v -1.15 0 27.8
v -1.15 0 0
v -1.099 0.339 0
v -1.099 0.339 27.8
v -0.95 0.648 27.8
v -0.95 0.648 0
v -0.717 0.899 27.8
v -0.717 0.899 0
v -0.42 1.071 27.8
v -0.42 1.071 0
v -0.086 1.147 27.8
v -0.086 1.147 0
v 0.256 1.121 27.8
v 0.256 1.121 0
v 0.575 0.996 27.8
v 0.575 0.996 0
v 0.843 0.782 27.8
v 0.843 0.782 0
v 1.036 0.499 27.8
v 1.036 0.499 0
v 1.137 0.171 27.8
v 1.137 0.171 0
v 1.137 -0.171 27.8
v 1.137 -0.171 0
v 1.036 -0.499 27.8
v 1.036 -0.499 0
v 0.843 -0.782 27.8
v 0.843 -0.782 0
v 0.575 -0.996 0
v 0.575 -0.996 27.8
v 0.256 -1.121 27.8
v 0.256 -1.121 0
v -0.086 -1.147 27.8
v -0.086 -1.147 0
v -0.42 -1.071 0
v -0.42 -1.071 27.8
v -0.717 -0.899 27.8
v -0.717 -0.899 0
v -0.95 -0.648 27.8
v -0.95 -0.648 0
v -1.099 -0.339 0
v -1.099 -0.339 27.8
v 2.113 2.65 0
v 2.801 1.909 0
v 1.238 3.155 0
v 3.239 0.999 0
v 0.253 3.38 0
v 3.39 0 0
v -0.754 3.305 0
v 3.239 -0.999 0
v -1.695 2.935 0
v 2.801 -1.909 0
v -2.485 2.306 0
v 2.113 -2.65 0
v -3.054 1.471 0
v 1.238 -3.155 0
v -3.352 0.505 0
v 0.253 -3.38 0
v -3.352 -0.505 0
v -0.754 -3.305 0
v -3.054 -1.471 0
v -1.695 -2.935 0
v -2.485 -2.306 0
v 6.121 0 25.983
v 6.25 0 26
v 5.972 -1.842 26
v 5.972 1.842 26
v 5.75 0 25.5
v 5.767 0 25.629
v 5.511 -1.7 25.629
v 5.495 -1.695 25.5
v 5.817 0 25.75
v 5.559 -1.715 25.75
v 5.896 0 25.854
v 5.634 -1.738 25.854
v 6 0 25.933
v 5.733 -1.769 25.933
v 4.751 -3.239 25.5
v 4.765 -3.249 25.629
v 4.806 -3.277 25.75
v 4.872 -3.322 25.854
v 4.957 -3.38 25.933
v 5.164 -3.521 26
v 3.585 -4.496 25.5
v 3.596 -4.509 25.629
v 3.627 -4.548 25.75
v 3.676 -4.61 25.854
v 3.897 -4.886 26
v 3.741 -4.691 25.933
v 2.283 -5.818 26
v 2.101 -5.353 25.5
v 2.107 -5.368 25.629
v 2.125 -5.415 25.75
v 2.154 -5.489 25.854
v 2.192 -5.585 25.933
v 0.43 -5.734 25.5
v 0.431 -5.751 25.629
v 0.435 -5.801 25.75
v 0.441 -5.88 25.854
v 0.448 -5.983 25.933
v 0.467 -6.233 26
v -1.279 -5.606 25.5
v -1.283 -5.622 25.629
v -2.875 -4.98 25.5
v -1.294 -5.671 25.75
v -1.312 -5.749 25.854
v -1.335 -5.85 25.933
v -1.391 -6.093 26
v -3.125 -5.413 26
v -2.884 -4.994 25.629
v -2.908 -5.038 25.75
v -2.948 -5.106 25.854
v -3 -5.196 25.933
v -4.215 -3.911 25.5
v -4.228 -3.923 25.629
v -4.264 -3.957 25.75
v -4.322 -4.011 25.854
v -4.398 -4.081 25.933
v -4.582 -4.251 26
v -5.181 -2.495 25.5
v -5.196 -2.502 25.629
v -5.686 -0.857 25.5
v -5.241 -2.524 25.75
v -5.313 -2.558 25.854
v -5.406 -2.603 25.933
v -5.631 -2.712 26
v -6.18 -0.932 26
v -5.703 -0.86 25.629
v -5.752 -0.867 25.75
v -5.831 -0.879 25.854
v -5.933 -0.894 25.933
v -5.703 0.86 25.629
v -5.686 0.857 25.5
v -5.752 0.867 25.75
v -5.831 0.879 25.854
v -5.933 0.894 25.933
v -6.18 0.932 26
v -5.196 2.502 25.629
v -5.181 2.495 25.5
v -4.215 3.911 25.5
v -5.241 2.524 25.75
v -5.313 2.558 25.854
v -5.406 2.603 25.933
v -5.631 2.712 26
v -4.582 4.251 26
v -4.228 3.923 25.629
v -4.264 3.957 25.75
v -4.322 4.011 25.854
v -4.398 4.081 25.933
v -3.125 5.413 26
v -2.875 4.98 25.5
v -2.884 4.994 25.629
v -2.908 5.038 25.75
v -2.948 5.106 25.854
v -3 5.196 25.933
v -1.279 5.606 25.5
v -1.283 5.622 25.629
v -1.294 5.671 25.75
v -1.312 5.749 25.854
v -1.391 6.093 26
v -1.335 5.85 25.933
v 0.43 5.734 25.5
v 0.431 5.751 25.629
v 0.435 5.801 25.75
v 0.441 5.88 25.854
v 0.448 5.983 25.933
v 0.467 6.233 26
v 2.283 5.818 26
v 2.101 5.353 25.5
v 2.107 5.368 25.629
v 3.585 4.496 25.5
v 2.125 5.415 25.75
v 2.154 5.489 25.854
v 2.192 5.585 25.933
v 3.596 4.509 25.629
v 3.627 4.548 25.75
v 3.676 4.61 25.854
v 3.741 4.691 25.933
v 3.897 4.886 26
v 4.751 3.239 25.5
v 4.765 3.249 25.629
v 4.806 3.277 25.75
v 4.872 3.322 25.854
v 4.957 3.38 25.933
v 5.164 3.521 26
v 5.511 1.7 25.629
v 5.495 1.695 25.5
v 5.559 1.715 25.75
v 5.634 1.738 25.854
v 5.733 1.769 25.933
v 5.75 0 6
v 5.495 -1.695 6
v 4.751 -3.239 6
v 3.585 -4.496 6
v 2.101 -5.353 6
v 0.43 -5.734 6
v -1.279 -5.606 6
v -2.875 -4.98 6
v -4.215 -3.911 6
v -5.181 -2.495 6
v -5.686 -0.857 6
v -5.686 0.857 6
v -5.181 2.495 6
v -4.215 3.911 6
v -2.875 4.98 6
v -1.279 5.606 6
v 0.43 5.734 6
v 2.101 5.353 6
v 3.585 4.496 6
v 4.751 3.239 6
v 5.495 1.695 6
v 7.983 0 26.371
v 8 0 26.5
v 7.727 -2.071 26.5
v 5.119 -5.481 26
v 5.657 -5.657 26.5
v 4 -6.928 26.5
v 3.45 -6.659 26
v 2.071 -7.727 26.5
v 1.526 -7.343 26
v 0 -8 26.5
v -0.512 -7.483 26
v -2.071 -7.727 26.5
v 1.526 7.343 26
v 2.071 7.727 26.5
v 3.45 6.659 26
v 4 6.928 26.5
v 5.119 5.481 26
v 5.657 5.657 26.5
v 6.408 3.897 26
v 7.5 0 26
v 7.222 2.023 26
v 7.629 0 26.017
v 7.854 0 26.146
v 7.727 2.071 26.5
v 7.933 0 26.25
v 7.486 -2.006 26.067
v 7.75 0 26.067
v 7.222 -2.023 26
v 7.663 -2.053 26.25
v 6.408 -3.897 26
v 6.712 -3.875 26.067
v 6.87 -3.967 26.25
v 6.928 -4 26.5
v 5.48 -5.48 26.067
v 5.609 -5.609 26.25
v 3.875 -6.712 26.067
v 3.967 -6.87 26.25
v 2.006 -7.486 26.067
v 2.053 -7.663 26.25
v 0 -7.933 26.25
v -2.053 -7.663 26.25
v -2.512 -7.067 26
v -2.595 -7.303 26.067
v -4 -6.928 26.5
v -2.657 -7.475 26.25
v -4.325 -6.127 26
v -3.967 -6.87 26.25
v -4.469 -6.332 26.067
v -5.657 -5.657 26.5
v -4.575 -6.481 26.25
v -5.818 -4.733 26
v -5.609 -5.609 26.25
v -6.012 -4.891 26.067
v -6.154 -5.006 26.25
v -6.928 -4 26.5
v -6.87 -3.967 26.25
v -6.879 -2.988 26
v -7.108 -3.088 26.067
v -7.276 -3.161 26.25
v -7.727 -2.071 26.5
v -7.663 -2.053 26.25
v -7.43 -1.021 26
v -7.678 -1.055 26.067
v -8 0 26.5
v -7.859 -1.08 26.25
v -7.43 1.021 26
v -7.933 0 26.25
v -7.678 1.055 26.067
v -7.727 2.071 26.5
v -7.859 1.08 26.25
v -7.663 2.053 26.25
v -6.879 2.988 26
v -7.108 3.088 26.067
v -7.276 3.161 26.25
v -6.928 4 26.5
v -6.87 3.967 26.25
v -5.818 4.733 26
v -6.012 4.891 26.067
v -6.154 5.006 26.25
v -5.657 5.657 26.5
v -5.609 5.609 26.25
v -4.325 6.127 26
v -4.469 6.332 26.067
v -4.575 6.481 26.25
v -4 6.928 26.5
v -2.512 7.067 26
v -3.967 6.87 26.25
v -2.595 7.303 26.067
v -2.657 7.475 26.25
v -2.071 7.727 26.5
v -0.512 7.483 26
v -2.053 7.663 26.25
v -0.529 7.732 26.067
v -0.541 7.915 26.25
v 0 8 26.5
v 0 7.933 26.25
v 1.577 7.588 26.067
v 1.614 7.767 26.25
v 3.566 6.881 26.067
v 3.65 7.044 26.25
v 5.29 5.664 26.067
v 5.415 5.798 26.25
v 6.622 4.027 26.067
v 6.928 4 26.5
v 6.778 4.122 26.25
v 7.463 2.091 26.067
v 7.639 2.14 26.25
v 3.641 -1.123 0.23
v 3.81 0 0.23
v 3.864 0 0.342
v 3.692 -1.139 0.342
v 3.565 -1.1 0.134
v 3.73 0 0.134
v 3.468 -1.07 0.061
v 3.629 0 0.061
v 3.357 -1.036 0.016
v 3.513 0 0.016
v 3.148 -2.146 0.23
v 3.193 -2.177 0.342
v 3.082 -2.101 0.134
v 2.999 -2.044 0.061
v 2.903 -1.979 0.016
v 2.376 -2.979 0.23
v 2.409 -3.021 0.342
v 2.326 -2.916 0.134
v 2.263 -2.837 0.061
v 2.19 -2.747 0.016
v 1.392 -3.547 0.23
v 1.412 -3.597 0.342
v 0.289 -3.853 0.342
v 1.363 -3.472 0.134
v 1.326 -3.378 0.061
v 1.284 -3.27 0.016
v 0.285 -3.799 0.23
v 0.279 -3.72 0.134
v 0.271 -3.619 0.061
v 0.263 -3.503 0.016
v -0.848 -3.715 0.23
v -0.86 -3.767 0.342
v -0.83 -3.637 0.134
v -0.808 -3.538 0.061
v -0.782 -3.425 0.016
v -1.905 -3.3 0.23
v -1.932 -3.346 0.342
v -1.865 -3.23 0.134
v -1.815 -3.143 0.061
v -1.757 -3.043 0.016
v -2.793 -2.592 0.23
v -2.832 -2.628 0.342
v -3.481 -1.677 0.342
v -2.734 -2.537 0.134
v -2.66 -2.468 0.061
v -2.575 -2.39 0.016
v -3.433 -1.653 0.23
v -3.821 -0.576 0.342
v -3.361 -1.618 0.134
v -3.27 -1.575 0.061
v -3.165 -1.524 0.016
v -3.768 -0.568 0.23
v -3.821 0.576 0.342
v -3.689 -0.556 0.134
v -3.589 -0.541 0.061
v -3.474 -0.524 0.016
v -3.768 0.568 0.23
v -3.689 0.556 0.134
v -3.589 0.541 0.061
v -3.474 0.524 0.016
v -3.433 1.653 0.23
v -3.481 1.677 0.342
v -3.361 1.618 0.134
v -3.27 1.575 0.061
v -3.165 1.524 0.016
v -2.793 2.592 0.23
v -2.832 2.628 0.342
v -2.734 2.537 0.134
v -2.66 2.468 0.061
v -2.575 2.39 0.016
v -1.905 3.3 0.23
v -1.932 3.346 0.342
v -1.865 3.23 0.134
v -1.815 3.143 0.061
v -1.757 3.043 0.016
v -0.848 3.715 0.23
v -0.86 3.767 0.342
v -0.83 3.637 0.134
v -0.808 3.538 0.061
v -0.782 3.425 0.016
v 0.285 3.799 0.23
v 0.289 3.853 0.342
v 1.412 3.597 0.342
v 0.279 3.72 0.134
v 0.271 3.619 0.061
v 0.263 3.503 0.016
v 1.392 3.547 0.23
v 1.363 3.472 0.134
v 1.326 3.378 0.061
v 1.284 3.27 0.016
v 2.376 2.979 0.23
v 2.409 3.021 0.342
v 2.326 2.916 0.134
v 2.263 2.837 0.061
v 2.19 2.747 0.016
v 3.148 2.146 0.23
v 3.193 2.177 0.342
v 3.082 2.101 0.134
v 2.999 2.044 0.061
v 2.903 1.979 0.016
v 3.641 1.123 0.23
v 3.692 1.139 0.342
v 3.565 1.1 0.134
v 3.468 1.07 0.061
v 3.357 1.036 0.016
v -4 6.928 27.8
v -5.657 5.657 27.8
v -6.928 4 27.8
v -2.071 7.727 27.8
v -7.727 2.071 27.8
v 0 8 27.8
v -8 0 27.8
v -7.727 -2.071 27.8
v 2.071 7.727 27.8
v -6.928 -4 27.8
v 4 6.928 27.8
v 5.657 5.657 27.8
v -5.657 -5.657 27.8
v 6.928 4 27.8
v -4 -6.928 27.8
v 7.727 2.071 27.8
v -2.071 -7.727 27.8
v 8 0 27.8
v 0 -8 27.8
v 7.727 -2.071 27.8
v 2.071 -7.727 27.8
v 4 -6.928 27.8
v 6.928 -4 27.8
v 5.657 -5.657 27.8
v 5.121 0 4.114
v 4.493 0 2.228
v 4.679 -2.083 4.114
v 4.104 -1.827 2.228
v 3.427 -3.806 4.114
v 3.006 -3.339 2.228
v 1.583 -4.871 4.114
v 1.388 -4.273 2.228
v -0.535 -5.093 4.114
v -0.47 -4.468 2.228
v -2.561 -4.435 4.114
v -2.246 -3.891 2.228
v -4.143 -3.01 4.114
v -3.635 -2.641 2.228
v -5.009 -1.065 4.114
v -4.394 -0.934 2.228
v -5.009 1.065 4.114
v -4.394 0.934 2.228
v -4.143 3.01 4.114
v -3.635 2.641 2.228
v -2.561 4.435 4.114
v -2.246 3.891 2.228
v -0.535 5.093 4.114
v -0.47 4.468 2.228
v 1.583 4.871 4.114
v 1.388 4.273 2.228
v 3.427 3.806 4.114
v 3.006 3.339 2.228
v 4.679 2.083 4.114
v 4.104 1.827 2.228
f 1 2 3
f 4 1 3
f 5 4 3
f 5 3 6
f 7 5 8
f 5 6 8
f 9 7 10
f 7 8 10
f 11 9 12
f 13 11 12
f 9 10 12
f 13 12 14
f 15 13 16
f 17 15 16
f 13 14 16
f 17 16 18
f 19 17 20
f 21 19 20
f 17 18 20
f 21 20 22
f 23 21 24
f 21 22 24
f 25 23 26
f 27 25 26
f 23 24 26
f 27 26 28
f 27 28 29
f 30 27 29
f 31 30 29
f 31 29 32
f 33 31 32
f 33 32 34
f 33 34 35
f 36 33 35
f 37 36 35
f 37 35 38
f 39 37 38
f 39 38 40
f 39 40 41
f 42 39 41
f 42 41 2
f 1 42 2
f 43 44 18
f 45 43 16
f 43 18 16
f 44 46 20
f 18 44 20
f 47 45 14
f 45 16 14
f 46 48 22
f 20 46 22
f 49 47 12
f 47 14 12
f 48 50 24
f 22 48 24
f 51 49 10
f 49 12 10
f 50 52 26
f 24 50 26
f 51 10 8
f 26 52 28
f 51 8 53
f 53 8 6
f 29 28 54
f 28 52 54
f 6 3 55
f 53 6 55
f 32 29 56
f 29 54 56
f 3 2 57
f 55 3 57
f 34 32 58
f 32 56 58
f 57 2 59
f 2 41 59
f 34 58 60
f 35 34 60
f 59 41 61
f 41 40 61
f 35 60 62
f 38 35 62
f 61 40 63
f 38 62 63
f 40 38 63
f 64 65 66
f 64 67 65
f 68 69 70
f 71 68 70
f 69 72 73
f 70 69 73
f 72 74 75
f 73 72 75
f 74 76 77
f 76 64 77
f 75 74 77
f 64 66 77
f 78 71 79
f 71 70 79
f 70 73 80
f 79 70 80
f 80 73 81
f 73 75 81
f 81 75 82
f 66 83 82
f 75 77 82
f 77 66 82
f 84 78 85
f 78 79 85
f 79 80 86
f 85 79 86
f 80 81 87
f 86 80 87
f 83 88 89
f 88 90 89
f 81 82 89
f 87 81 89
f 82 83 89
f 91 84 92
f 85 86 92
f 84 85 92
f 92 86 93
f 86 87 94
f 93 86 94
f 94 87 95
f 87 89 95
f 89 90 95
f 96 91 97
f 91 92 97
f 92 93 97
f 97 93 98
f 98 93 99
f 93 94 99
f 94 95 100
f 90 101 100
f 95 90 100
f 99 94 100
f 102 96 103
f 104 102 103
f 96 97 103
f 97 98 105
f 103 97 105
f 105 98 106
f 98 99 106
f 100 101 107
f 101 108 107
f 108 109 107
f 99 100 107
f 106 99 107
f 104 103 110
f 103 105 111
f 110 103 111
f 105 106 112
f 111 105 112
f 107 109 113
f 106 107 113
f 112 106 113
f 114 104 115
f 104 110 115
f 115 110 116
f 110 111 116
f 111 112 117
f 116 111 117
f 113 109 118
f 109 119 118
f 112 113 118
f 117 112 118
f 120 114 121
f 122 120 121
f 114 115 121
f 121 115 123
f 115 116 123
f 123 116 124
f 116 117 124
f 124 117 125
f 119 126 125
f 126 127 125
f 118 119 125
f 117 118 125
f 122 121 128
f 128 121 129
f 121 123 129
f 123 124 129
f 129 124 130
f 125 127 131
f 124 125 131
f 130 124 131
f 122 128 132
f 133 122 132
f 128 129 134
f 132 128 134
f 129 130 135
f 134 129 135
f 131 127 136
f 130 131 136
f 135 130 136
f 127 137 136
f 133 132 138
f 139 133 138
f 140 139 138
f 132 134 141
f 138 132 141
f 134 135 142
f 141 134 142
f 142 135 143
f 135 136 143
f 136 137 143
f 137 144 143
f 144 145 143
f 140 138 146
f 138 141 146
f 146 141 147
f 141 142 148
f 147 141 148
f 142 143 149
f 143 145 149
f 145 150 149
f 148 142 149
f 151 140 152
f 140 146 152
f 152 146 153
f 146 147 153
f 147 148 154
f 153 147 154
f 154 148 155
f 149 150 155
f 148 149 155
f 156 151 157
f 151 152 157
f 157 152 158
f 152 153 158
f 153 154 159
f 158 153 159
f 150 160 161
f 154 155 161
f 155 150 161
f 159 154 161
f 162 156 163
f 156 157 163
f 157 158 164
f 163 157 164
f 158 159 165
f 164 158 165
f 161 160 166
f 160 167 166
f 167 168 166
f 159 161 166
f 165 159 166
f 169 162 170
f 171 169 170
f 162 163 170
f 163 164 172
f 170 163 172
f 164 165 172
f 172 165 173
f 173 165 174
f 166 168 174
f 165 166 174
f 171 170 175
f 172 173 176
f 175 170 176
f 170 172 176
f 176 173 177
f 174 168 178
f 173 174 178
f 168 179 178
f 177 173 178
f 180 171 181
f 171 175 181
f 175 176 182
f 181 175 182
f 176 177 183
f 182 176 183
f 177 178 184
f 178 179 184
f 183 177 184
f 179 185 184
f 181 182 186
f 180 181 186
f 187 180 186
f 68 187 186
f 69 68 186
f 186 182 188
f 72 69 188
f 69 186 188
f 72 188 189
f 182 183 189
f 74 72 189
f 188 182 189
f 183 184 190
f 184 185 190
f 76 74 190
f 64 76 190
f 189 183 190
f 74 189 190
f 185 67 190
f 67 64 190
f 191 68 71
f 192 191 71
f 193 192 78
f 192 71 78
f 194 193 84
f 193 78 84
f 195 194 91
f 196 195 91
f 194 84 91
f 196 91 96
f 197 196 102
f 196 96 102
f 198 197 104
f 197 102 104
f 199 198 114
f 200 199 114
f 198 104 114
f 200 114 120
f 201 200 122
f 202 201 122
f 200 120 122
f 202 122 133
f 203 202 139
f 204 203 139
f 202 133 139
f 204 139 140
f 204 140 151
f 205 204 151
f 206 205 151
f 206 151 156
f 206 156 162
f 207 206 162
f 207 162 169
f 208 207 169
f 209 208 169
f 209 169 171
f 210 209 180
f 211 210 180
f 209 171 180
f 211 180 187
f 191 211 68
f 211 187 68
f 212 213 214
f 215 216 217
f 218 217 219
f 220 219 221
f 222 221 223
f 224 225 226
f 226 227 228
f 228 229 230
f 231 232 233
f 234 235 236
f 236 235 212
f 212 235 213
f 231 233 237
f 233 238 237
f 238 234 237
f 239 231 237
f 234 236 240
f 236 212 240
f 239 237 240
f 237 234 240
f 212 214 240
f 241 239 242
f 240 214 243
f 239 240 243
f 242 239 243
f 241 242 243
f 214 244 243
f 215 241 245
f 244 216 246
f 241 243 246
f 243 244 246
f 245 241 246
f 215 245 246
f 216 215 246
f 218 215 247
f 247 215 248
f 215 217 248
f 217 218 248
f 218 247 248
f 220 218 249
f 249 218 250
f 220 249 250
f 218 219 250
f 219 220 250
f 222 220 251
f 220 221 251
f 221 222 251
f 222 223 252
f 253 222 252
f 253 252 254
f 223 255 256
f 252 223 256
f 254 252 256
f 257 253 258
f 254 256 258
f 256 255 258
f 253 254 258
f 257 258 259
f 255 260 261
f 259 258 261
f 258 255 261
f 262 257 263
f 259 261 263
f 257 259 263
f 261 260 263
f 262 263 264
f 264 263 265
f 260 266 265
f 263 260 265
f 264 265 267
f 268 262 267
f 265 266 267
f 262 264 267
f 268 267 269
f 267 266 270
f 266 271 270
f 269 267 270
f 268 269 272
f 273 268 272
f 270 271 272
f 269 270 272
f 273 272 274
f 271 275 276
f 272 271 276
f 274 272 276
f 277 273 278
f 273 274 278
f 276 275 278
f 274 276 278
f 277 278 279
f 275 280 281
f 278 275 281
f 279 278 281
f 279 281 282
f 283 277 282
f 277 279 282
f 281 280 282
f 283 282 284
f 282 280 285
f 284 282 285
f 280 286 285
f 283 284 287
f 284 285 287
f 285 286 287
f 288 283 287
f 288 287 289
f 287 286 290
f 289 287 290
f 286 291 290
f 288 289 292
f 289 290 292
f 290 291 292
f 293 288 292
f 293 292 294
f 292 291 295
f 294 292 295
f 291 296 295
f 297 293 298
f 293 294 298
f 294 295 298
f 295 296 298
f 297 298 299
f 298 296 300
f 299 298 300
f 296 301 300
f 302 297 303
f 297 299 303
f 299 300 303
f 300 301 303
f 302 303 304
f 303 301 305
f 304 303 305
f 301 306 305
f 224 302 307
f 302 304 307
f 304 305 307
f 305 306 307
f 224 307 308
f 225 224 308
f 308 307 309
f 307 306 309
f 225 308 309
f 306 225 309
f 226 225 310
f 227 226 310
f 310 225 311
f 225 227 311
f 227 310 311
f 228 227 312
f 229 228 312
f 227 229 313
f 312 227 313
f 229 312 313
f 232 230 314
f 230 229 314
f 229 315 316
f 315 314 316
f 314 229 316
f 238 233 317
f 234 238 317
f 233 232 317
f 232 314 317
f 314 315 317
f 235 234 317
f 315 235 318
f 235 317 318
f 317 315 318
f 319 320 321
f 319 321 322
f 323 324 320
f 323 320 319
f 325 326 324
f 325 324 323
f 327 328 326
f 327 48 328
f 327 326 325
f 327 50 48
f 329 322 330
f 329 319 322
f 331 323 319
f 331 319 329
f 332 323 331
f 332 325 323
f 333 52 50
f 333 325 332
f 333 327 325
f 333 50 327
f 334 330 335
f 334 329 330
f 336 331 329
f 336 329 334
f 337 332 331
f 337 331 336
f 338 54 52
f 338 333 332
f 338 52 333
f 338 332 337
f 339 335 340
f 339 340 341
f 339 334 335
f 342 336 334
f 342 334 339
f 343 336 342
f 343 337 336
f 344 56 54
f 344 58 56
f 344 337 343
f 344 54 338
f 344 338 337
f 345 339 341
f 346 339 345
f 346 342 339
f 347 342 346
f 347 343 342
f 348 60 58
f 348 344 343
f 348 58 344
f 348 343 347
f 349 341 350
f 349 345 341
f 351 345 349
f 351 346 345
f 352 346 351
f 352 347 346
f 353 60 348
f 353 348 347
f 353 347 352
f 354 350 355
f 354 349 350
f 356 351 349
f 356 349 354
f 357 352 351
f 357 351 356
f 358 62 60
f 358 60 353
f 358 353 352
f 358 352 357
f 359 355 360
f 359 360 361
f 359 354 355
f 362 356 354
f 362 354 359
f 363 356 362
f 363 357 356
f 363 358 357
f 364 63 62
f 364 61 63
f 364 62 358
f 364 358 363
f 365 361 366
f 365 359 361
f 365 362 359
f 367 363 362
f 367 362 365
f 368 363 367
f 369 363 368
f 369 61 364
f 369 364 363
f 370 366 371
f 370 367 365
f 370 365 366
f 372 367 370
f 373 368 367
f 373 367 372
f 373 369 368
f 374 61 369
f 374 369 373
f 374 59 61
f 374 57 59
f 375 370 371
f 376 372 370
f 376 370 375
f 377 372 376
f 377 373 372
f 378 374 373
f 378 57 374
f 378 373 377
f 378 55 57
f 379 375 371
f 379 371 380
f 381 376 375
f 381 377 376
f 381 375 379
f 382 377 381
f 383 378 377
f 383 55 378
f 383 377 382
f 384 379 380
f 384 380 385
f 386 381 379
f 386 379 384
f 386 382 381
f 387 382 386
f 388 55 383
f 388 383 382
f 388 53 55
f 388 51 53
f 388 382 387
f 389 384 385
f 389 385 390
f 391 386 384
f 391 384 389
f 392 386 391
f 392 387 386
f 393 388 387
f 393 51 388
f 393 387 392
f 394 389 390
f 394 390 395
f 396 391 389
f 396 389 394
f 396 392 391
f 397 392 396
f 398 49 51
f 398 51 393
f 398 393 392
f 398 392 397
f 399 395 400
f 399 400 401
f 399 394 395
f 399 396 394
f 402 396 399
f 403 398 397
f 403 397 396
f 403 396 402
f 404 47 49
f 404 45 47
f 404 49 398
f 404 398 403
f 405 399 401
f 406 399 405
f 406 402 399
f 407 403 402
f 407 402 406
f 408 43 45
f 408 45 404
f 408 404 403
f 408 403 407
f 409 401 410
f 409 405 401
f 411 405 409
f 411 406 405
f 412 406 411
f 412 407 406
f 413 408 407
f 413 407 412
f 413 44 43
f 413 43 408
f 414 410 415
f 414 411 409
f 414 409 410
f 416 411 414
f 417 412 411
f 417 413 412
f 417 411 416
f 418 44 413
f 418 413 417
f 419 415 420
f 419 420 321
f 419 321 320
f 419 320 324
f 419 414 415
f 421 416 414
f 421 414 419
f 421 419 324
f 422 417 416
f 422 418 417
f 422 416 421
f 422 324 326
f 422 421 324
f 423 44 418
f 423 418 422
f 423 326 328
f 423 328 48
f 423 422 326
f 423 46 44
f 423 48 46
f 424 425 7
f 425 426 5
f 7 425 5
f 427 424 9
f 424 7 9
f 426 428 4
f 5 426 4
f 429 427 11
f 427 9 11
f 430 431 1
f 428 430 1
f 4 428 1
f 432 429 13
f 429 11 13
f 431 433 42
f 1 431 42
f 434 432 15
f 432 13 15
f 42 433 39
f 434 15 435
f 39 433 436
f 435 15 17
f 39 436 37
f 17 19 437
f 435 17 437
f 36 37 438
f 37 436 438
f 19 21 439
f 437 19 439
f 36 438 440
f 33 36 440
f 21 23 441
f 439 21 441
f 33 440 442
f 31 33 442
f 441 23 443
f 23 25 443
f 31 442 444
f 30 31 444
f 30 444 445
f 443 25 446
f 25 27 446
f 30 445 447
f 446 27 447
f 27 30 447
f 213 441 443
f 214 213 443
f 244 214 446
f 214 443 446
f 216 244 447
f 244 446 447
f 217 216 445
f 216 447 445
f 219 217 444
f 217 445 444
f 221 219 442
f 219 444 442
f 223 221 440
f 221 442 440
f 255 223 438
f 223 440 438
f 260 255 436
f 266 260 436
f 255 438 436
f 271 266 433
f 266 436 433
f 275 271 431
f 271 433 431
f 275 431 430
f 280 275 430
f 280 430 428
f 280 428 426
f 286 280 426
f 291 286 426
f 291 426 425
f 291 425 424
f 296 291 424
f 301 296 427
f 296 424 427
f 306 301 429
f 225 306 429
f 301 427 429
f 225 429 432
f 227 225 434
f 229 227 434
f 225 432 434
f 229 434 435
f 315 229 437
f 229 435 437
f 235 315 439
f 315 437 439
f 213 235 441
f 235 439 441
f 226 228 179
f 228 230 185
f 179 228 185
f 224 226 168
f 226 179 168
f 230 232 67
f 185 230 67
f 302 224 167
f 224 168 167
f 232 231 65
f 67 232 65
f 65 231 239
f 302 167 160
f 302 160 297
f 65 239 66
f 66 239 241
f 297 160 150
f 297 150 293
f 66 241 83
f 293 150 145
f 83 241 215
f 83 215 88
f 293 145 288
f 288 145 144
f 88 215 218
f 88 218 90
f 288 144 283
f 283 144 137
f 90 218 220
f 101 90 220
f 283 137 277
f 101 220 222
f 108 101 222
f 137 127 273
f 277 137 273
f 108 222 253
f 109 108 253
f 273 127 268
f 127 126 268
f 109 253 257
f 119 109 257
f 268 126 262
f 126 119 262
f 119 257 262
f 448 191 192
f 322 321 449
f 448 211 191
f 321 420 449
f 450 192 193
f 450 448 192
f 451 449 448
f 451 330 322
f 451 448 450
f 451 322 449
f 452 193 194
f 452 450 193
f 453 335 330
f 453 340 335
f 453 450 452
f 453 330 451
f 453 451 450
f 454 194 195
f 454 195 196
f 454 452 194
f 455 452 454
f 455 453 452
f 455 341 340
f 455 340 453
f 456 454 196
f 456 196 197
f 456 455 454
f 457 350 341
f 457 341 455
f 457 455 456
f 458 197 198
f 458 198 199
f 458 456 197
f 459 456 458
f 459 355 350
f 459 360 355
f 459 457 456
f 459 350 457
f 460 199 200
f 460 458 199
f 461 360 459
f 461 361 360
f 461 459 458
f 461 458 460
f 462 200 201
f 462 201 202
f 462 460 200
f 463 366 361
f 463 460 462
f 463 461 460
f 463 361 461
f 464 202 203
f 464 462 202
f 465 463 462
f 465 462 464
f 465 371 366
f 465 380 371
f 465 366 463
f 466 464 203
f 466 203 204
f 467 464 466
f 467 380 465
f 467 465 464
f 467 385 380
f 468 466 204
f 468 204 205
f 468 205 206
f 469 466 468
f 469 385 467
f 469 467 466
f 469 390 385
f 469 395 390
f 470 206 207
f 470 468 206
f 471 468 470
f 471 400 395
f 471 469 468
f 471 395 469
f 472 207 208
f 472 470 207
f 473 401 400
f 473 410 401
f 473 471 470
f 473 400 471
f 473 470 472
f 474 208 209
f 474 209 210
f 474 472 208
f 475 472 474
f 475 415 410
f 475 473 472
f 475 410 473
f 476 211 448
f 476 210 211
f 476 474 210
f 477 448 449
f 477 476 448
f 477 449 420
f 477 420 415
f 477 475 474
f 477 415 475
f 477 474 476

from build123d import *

# Parameters (mm, degrees)
F2_R     = 0.5
F3_SIZE2 = 2
F3_SIZE  = 6
F4_R     = 0.5
F6_D     = 2.3
F7_R     = 0.5


with BuildPart() as f1:
    # F0 (on Front) → F1 (revolve)
    with BuildSketch(Plane.XZ):
        Polygon((8, 27.8), (0, 27.8), (0, 0), (5.75, 0), (5.75, 26), (8, 26), align=None)
    revolve(axis=Axis((0, 0, 13.9), (0, 0, -1)))

    # F2
    f2_edges = [f1.edges().sort_by_distance(p)[0] for p in [
        (-5.75, 0, 26),
    ]]
    fillet(f2_edges, radius=F2_R)

    # F3
    f3_edges = [f1.edges().sort_by_distance(p)[0] for p in [
        (-5.75, 0, 0),
    ]]
    chamfer(f3_edges, length=F3_SIZE, length2=F3_SIZE2)

    # F4
    f4_edges = [f1.edges().sort_by_distance(p)[0] for p in [
        (-3.75, 0, 0),
    ]]
    fillet(f4_edges, radius=F4_R)

    # F6 (through all)
    with Locations(Plane.XY.offset(27.8)):
        with Locations((0, 0)):
            Hole(F6_D / 2)

    # F7
    f7_edges = [f1.edges().sort_by_distance(p)[0] for p in [
        (-8, 0, 26),
    ]]
    fillet(f7_edges, radius=F7_R)


solid = f1.part
